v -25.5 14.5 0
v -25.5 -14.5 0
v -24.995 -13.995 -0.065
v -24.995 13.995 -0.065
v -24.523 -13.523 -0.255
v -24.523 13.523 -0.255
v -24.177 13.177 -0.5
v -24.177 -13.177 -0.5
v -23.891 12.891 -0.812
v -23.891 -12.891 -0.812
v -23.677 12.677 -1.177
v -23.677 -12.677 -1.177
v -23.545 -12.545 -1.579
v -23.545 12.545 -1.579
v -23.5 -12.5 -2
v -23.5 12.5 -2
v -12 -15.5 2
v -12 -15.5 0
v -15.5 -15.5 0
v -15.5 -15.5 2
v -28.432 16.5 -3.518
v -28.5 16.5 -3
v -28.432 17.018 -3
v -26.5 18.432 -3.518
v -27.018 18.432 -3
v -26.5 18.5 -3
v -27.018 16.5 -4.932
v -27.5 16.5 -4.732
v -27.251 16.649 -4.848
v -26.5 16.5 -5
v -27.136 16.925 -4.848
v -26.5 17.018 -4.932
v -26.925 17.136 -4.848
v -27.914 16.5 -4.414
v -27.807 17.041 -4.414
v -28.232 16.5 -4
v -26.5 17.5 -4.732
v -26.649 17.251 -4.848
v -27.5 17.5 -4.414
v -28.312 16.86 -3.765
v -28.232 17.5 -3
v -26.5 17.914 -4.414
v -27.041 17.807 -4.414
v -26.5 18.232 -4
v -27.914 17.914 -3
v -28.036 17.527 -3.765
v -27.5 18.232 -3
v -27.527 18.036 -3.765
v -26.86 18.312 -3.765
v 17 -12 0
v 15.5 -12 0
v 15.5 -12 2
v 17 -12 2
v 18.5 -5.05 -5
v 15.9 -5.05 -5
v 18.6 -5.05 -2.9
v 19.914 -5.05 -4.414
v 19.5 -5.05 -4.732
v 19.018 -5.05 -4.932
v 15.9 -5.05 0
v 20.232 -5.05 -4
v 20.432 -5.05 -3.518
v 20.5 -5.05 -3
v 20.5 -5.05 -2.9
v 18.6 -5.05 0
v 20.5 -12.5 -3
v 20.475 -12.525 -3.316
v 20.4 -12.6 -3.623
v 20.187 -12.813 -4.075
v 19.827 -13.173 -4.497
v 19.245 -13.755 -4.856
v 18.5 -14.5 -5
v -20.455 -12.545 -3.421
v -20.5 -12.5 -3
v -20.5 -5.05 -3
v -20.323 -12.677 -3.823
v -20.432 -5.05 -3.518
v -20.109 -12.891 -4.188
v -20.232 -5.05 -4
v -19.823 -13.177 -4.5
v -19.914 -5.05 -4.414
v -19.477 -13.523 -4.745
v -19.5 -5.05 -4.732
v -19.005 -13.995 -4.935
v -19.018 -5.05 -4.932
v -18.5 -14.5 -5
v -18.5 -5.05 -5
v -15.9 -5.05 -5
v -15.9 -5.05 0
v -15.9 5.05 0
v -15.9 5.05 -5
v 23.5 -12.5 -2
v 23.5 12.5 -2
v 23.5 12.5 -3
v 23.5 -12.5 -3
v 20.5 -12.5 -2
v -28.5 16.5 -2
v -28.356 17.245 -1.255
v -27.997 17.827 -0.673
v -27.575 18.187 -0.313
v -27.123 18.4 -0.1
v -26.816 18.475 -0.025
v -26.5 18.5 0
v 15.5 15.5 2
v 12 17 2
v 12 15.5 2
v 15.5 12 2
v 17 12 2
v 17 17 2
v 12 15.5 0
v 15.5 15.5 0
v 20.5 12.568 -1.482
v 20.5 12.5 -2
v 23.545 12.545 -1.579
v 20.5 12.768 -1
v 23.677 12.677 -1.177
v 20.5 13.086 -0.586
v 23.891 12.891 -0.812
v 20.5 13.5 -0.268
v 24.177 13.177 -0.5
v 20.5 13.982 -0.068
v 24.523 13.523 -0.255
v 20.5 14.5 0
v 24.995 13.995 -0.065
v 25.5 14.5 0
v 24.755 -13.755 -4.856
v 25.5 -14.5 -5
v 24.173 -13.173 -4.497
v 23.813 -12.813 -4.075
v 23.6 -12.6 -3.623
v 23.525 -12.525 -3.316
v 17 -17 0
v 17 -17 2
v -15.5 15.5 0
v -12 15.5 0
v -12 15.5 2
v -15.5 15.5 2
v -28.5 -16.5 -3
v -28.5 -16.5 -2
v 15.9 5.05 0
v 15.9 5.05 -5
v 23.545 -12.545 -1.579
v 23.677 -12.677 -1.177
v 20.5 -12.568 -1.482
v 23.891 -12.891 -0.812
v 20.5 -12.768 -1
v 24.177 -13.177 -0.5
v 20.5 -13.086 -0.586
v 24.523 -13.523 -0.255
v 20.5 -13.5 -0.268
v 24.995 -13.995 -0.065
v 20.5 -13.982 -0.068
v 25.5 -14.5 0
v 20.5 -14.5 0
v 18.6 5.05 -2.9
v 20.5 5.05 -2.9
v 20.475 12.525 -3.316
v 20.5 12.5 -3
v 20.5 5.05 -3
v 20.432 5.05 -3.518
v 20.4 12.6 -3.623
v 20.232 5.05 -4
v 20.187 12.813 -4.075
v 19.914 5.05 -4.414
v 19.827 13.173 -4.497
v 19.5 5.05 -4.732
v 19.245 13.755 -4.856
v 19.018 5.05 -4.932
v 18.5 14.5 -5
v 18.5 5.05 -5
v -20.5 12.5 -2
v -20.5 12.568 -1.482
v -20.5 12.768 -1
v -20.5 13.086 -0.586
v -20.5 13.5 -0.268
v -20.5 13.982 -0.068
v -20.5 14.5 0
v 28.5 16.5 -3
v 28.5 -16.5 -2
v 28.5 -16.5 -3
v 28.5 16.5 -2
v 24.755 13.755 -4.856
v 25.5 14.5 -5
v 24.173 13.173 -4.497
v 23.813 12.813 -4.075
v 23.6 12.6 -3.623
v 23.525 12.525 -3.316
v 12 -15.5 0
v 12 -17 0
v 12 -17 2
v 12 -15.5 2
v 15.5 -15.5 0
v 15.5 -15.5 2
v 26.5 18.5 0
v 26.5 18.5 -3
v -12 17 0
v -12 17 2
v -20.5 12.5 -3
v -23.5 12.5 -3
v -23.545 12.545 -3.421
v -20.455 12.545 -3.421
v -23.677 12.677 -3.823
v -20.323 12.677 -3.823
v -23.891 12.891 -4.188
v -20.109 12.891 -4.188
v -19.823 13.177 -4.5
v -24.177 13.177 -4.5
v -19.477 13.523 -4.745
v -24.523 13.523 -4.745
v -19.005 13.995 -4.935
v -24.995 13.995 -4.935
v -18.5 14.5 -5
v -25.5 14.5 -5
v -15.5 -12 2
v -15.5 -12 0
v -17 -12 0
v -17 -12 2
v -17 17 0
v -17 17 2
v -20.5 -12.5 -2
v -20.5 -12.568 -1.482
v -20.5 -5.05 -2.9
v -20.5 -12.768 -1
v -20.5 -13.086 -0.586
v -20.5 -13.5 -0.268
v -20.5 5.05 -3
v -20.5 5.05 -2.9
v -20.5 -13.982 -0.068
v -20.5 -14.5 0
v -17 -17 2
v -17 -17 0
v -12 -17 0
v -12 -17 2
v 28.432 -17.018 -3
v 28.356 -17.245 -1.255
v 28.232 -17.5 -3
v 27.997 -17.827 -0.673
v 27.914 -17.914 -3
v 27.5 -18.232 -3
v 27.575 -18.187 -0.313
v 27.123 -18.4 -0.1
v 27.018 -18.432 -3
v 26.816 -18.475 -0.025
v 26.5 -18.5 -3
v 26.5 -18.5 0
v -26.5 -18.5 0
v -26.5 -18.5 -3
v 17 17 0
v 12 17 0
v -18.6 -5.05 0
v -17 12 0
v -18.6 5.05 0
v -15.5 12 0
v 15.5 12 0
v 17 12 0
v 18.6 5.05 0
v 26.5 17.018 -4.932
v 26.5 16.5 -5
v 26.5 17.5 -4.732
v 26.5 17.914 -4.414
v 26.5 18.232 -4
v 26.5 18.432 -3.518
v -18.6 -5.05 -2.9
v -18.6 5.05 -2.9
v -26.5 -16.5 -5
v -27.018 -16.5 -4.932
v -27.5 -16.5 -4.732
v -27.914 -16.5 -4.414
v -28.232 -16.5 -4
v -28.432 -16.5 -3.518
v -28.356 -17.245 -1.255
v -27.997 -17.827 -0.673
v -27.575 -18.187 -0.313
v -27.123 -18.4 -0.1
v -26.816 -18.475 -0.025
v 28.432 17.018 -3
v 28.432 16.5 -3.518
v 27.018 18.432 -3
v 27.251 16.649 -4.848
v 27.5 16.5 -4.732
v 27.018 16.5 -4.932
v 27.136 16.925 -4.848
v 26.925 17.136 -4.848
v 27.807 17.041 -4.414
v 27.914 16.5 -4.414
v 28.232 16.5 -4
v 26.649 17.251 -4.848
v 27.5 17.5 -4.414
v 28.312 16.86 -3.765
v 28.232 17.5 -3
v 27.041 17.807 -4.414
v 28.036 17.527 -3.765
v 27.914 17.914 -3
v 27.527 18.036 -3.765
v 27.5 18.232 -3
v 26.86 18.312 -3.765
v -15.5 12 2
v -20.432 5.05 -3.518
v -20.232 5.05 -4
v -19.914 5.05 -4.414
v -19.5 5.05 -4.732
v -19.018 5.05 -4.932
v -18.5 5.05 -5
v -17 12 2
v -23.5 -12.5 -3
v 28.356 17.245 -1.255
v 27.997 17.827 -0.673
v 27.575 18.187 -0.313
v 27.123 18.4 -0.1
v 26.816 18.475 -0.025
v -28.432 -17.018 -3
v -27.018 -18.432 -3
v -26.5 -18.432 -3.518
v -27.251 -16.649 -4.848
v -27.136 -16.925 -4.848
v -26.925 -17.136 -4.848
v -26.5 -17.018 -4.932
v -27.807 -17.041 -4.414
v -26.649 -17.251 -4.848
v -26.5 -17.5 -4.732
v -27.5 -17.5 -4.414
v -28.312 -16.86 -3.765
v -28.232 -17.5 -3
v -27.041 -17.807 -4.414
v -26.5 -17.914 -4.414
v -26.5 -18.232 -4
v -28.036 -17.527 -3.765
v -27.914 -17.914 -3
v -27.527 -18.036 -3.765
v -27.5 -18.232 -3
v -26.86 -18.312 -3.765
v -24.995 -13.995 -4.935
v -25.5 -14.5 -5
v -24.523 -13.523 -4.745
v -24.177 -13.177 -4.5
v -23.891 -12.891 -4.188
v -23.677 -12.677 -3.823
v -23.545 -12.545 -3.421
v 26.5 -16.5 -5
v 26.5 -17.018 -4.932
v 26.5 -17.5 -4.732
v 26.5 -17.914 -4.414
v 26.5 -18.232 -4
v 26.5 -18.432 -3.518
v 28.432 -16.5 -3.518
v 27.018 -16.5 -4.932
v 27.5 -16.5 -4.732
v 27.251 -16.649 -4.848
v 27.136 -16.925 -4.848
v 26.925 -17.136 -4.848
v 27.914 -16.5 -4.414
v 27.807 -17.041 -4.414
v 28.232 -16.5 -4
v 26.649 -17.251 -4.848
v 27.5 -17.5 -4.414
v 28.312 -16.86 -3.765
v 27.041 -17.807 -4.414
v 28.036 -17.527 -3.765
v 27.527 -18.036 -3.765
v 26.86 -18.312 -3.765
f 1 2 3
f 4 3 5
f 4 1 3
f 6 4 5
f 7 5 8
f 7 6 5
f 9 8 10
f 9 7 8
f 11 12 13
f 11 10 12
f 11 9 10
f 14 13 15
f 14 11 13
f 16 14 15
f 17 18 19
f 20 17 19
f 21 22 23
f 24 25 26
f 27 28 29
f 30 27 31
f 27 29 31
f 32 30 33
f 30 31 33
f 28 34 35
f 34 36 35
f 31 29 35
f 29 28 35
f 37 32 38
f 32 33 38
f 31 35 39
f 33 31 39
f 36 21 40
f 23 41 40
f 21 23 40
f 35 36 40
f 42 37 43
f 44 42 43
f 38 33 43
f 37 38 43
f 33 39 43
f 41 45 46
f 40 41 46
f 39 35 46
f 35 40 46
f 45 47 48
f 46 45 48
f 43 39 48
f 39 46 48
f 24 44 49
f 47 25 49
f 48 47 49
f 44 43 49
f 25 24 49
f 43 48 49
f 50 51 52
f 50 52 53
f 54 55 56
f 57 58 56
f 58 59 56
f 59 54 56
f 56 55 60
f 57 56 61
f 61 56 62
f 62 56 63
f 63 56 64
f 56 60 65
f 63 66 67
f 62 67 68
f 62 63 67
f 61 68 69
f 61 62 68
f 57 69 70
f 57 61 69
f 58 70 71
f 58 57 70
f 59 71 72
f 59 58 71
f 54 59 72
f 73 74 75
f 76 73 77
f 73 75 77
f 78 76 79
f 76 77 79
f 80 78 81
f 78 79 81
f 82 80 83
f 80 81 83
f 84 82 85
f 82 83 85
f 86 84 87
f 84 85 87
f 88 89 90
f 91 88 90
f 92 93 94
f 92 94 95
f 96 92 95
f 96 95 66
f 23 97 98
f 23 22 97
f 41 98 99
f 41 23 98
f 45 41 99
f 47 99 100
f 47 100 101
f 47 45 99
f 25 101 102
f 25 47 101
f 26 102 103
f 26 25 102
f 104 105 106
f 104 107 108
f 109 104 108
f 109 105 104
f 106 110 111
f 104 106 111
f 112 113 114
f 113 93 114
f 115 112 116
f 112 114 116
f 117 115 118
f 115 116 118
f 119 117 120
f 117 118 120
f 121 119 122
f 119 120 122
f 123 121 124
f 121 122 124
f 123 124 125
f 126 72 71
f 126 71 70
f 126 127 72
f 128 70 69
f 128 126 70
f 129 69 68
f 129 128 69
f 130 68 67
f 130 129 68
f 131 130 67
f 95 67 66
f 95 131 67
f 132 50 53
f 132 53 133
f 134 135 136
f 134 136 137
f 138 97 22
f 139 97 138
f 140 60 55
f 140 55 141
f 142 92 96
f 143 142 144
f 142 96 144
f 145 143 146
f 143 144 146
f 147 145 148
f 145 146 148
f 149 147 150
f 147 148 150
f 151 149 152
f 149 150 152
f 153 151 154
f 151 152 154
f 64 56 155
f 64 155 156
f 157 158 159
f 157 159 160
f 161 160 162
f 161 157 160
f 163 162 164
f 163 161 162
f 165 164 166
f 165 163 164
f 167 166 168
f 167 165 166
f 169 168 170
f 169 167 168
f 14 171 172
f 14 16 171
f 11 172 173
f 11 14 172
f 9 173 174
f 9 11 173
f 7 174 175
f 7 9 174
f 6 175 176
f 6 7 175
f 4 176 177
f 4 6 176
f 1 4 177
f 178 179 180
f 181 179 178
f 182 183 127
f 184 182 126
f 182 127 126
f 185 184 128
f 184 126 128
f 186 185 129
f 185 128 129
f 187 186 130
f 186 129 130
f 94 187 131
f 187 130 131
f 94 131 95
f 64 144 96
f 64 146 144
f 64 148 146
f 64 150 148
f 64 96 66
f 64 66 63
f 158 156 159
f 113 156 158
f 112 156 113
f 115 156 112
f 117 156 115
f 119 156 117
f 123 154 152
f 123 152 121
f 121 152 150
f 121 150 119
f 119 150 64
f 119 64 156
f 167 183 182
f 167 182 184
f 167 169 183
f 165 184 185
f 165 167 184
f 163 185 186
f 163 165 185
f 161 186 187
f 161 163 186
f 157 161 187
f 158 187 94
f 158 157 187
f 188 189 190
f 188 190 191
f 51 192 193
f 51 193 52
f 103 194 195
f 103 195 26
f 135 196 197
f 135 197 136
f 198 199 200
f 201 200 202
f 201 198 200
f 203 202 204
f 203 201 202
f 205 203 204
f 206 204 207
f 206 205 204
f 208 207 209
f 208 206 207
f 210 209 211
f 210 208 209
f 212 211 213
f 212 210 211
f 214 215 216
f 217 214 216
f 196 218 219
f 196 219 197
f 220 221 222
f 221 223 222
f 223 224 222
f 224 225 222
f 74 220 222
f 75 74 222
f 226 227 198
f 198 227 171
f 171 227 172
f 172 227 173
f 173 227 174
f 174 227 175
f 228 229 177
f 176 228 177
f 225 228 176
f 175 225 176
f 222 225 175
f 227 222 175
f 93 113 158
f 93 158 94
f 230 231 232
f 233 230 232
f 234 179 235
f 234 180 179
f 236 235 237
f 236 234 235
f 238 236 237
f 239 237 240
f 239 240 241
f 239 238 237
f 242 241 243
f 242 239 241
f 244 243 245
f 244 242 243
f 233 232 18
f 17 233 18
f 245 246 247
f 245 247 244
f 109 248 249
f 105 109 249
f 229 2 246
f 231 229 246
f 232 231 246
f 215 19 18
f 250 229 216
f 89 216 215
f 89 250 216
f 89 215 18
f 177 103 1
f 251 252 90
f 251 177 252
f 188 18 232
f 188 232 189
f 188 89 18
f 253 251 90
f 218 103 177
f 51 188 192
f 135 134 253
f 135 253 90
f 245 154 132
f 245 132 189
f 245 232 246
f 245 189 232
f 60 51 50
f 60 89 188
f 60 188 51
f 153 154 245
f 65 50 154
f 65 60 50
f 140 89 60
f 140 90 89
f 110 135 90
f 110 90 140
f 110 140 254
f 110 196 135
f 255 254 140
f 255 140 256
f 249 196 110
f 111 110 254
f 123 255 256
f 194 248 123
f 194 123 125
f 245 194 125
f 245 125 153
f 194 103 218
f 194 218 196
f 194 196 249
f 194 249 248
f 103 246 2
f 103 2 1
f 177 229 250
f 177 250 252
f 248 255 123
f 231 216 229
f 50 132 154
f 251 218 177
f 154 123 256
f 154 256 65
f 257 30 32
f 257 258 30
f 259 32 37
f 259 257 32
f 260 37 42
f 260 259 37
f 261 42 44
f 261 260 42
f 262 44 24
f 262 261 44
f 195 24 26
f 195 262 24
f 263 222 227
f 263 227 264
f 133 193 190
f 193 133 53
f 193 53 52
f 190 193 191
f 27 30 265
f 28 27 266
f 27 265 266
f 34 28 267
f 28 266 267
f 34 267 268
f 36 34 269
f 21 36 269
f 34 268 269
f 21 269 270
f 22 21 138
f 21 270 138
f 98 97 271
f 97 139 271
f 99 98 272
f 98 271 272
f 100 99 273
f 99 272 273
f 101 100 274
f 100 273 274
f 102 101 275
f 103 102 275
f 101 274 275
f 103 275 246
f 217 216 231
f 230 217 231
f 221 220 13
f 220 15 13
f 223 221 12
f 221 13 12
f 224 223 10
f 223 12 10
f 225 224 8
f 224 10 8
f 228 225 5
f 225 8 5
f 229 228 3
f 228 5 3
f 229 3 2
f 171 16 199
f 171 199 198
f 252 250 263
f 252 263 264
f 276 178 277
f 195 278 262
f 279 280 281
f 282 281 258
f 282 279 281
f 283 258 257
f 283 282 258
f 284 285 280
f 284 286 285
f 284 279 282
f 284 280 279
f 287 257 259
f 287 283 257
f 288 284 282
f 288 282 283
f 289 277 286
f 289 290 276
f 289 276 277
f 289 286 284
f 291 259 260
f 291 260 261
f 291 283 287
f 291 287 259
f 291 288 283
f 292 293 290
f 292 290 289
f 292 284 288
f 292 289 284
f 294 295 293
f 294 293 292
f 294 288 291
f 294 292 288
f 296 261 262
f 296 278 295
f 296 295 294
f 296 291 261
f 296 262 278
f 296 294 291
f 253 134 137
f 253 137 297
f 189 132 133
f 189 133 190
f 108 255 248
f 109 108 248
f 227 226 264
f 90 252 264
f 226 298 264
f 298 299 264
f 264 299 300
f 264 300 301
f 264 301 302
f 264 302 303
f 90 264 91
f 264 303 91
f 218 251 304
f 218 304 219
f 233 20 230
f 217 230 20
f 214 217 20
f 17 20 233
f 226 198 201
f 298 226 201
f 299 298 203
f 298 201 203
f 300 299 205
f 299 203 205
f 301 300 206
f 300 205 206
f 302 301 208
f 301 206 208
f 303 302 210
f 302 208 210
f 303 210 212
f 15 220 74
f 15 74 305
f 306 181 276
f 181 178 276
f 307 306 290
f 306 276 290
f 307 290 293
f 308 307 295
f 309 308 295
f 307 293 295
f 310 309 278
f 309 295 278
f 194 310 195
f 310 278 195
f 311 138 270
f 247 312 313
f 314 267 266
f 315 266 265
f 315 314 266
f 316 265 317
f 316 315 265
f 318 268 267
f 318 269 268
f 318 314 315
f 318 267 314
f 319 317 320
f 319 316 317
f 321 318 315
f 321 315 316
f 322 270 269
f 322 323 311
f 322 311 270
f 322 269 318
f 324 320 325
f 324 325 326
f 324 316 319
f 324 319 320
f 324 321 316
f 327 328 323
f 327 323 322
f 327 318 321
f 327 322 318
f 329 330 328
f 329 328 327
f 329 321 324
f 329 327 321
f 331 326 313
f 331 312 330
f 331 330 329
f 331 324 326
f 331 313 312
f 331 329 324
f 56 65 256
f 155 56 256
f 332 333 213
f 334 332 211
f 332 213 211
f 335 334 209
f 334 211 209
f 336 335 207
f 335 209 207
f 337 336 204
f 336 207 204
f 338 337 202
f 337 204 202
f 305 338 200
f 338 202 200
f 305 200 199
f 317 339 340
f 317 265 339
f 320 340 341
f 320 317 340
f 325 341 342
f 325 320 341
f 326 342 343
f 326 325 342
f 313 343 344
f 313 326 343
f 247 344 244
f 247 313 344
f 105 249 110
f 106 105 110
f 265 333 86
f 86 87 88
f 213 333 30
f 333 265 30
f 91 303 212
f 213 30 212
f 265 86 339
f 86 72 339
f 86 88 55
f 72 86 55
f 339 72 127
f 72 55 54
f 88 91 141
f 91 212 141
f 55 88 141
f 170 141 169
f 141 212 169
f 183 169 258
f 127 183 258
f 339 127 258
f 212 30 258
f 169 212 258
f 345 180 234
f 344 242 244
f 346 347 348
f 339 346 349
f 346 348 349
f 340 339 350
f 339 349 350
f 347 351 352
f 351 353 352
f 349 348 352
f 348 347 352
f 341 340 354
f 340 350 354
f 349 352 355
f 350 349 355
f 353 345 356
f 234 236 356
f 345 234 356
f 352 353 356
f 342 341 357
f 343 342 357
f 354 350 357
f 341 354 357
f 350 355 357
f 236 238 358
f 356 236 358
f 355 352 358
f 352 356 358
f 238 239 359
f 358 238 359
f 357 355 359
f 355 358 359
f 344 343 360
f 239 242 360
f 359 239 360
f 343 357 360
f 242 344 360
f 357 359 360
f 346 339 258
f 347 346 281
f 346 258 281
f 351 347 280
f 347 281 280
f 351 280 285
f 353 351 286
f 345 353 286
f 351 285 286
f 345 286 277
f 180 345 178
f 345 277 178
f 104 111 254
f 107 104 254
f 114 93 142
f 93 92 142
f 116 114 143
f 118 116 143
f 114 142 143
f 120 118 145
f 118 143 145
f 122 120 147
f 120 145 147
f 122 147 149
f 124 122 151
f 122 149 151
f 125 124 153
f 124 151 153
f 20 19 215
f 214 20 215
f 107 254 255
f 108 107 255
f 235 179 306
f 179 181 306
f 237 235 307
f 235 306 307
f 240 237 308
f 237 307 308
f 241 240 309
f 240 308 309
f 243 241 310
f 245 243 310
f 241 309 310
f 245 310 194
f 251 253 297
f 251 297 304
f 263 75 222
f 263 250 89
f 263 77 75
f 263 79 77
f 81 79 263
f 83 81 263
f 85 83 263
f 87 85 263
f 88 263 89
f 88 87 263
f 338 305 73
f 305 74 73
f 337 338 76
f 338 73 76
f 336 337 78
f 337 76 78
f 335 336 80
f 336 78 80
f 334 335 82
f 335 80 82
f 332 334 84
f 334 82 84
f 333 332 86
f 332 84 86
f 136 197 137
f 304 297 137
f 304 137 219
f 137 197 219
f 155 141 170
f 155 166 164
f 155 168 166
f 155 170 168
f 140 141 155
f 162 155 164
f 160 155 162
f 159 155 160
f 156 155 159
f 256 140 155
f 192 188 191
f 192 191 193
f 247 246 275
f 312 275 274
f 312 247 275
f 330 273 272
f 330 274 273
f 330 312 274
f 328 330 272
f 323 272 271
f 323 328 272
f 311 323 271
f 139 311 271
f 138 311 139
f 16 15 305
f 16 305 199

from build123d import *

# Parameters (mm, degrees)
SKETCH016_W     = 41
SKETCH016_H     = 37
SKETCH016_W_2   = 2.7
SKETCH016_H_2   = 10.1
PAD006_DEPTH    = 5
SKETCH017_W     = 1.9
SKETCH017_H     = 10.1
POCKET010_DEPTH = 2.1
PAD008_DEPTH    = 2
PAD007_DEPTH    = 5
FILLET_R        = 2
FILLET004_R     = 2
FILLET005_R     = 2


with BuildPart() as part:
    # Sketch016 → Pad006 (new body)
    with BuildSketch(Plane.XY):
        Rectangle(SKETCH016_W, SKETCH016_H)
        with Locations((-17.25, 0)):
            Rectangle(SKETCH016_W_2, SKETCH016_H_2, mode=Mode.SUBTRACT)
        with Locations((17.25, 0)):
            Rectangle(SKETCH016_W_2, SKETCH016_H_2, mode=Mode.SUBTRACT)
    extrude(amount=-PAD006_DEPTH)

    # Sketch017 (on Face14 of Pad006) → Pocket010 (cut)
    with BuildSketch(Plane(origin=(0, 0, -5), x_dir=(1, 0, 0), z_dir=(0, 0, -1))):
        with Locations((-19.55, 0)):
            Rectangle(SKETCH017_W, SKETCH017_H)
        with Locations((19.55, 0)):
            Rectangle(SKETCH017_W, SKETCH017_H)
    extrude(amount=-POCKET010_DEPTH, mode=Mode.SUBTRACT)

    # Sketch023 (on Face4 of Pocket010) → Pad008 (join)
    with BuildSketch(Plane.XY):
        Polygon((-17, 17), (-12, 17), (-12, 15.5), (-15.5, 15.5), (-15.5, 12), (-17, 12), align=None)
        Polygon((17, 17), (12, 17), (12, 15.5), (15.5, 15.5), (15.5, 12), (17, 12), align=None)
        Polygon((-17, -17), (-12, -17), (-12, -15.5), (-15.5, -15.5), (-15.5, -12), (-17, -12), align=None)
        Polygon((17, -17), (12, -17), (12, -15.5), (15.5, -15.5), (15.5, -12), (17, -12), align=None)
    extrude(amount=PAD008_DEPTH)

    # Sketch018 → Pad007 (join)
    with BuildSketch(Plane.XY):
        Polygon((-23.5, 12.5), (-20.5, 12.5), (-20.5, 18.5), (-28.5, 18.5), (-28.5, -18.5), (-20.5, -18.5), (-20.5, -12.5), (-23.5, -12.5), align=None)
        Polygon((20.5, 12.5), (23.5, 12.5), (23.5, -12.5), (20.5, -12.5), (20.5, -18.5), (28.5, -18.5), (28.5, 18.5), (20.5, 18.5), align=None)
    extrude(amount=-PAD007_DEPTH)

    # Fillet
    fillet_edges = [part.edges().sort_by_distance(p)[0] for p in [
        (-28.5, 18.5, -2.5),
        (-28.5, 0, 0),
        (-28.5, -18.5, -2.5),
        (-28.5, 0, -5),
        (28.5, -18.5, -2.5),
        (28.5, 0, 0),
        (28.5, 18.5, -2.5),
        (28.5, 0, -5),
        (23.5, 0, -5),
        (23.5, 0, 0),
        (-23.5, 0, 0),
        (-23.5, 0, -5),
        (0, -18.5, -5),
        (0, 18.5, -5),
    ]]
    fillet(fillet_edges, radius=FILLET_R)

    # Fillet004
    fillet004_edges = [part.edges().sort_by_distance(p)[0] for p in [
        (-20.5, 8.775, -5),
        (-20.5, -8.775, -5),
        (20.5, 8.775, -5),
        (20.5, -8.775, -5),
    ]]
    fillet(fillet004_edges, radius=FILLET004_R)

    # Fillet005
    fillet005_edges = [part.edges().sort_by_distance(p)[0] for p in [
        (-22, -12.5, -5),
        (-22, 12.5, -5),
        (22, 12.5, -5),
        (-22, 12.5, 0),
        (-22, -12.5, 0),
        (22, 12.5, 0),
        (22, -12.5, 0),
        (22, -12.5, -5),
    ]]
    fillet(fillet005_edges, radius=FILLET005_R)


solid = part.part
